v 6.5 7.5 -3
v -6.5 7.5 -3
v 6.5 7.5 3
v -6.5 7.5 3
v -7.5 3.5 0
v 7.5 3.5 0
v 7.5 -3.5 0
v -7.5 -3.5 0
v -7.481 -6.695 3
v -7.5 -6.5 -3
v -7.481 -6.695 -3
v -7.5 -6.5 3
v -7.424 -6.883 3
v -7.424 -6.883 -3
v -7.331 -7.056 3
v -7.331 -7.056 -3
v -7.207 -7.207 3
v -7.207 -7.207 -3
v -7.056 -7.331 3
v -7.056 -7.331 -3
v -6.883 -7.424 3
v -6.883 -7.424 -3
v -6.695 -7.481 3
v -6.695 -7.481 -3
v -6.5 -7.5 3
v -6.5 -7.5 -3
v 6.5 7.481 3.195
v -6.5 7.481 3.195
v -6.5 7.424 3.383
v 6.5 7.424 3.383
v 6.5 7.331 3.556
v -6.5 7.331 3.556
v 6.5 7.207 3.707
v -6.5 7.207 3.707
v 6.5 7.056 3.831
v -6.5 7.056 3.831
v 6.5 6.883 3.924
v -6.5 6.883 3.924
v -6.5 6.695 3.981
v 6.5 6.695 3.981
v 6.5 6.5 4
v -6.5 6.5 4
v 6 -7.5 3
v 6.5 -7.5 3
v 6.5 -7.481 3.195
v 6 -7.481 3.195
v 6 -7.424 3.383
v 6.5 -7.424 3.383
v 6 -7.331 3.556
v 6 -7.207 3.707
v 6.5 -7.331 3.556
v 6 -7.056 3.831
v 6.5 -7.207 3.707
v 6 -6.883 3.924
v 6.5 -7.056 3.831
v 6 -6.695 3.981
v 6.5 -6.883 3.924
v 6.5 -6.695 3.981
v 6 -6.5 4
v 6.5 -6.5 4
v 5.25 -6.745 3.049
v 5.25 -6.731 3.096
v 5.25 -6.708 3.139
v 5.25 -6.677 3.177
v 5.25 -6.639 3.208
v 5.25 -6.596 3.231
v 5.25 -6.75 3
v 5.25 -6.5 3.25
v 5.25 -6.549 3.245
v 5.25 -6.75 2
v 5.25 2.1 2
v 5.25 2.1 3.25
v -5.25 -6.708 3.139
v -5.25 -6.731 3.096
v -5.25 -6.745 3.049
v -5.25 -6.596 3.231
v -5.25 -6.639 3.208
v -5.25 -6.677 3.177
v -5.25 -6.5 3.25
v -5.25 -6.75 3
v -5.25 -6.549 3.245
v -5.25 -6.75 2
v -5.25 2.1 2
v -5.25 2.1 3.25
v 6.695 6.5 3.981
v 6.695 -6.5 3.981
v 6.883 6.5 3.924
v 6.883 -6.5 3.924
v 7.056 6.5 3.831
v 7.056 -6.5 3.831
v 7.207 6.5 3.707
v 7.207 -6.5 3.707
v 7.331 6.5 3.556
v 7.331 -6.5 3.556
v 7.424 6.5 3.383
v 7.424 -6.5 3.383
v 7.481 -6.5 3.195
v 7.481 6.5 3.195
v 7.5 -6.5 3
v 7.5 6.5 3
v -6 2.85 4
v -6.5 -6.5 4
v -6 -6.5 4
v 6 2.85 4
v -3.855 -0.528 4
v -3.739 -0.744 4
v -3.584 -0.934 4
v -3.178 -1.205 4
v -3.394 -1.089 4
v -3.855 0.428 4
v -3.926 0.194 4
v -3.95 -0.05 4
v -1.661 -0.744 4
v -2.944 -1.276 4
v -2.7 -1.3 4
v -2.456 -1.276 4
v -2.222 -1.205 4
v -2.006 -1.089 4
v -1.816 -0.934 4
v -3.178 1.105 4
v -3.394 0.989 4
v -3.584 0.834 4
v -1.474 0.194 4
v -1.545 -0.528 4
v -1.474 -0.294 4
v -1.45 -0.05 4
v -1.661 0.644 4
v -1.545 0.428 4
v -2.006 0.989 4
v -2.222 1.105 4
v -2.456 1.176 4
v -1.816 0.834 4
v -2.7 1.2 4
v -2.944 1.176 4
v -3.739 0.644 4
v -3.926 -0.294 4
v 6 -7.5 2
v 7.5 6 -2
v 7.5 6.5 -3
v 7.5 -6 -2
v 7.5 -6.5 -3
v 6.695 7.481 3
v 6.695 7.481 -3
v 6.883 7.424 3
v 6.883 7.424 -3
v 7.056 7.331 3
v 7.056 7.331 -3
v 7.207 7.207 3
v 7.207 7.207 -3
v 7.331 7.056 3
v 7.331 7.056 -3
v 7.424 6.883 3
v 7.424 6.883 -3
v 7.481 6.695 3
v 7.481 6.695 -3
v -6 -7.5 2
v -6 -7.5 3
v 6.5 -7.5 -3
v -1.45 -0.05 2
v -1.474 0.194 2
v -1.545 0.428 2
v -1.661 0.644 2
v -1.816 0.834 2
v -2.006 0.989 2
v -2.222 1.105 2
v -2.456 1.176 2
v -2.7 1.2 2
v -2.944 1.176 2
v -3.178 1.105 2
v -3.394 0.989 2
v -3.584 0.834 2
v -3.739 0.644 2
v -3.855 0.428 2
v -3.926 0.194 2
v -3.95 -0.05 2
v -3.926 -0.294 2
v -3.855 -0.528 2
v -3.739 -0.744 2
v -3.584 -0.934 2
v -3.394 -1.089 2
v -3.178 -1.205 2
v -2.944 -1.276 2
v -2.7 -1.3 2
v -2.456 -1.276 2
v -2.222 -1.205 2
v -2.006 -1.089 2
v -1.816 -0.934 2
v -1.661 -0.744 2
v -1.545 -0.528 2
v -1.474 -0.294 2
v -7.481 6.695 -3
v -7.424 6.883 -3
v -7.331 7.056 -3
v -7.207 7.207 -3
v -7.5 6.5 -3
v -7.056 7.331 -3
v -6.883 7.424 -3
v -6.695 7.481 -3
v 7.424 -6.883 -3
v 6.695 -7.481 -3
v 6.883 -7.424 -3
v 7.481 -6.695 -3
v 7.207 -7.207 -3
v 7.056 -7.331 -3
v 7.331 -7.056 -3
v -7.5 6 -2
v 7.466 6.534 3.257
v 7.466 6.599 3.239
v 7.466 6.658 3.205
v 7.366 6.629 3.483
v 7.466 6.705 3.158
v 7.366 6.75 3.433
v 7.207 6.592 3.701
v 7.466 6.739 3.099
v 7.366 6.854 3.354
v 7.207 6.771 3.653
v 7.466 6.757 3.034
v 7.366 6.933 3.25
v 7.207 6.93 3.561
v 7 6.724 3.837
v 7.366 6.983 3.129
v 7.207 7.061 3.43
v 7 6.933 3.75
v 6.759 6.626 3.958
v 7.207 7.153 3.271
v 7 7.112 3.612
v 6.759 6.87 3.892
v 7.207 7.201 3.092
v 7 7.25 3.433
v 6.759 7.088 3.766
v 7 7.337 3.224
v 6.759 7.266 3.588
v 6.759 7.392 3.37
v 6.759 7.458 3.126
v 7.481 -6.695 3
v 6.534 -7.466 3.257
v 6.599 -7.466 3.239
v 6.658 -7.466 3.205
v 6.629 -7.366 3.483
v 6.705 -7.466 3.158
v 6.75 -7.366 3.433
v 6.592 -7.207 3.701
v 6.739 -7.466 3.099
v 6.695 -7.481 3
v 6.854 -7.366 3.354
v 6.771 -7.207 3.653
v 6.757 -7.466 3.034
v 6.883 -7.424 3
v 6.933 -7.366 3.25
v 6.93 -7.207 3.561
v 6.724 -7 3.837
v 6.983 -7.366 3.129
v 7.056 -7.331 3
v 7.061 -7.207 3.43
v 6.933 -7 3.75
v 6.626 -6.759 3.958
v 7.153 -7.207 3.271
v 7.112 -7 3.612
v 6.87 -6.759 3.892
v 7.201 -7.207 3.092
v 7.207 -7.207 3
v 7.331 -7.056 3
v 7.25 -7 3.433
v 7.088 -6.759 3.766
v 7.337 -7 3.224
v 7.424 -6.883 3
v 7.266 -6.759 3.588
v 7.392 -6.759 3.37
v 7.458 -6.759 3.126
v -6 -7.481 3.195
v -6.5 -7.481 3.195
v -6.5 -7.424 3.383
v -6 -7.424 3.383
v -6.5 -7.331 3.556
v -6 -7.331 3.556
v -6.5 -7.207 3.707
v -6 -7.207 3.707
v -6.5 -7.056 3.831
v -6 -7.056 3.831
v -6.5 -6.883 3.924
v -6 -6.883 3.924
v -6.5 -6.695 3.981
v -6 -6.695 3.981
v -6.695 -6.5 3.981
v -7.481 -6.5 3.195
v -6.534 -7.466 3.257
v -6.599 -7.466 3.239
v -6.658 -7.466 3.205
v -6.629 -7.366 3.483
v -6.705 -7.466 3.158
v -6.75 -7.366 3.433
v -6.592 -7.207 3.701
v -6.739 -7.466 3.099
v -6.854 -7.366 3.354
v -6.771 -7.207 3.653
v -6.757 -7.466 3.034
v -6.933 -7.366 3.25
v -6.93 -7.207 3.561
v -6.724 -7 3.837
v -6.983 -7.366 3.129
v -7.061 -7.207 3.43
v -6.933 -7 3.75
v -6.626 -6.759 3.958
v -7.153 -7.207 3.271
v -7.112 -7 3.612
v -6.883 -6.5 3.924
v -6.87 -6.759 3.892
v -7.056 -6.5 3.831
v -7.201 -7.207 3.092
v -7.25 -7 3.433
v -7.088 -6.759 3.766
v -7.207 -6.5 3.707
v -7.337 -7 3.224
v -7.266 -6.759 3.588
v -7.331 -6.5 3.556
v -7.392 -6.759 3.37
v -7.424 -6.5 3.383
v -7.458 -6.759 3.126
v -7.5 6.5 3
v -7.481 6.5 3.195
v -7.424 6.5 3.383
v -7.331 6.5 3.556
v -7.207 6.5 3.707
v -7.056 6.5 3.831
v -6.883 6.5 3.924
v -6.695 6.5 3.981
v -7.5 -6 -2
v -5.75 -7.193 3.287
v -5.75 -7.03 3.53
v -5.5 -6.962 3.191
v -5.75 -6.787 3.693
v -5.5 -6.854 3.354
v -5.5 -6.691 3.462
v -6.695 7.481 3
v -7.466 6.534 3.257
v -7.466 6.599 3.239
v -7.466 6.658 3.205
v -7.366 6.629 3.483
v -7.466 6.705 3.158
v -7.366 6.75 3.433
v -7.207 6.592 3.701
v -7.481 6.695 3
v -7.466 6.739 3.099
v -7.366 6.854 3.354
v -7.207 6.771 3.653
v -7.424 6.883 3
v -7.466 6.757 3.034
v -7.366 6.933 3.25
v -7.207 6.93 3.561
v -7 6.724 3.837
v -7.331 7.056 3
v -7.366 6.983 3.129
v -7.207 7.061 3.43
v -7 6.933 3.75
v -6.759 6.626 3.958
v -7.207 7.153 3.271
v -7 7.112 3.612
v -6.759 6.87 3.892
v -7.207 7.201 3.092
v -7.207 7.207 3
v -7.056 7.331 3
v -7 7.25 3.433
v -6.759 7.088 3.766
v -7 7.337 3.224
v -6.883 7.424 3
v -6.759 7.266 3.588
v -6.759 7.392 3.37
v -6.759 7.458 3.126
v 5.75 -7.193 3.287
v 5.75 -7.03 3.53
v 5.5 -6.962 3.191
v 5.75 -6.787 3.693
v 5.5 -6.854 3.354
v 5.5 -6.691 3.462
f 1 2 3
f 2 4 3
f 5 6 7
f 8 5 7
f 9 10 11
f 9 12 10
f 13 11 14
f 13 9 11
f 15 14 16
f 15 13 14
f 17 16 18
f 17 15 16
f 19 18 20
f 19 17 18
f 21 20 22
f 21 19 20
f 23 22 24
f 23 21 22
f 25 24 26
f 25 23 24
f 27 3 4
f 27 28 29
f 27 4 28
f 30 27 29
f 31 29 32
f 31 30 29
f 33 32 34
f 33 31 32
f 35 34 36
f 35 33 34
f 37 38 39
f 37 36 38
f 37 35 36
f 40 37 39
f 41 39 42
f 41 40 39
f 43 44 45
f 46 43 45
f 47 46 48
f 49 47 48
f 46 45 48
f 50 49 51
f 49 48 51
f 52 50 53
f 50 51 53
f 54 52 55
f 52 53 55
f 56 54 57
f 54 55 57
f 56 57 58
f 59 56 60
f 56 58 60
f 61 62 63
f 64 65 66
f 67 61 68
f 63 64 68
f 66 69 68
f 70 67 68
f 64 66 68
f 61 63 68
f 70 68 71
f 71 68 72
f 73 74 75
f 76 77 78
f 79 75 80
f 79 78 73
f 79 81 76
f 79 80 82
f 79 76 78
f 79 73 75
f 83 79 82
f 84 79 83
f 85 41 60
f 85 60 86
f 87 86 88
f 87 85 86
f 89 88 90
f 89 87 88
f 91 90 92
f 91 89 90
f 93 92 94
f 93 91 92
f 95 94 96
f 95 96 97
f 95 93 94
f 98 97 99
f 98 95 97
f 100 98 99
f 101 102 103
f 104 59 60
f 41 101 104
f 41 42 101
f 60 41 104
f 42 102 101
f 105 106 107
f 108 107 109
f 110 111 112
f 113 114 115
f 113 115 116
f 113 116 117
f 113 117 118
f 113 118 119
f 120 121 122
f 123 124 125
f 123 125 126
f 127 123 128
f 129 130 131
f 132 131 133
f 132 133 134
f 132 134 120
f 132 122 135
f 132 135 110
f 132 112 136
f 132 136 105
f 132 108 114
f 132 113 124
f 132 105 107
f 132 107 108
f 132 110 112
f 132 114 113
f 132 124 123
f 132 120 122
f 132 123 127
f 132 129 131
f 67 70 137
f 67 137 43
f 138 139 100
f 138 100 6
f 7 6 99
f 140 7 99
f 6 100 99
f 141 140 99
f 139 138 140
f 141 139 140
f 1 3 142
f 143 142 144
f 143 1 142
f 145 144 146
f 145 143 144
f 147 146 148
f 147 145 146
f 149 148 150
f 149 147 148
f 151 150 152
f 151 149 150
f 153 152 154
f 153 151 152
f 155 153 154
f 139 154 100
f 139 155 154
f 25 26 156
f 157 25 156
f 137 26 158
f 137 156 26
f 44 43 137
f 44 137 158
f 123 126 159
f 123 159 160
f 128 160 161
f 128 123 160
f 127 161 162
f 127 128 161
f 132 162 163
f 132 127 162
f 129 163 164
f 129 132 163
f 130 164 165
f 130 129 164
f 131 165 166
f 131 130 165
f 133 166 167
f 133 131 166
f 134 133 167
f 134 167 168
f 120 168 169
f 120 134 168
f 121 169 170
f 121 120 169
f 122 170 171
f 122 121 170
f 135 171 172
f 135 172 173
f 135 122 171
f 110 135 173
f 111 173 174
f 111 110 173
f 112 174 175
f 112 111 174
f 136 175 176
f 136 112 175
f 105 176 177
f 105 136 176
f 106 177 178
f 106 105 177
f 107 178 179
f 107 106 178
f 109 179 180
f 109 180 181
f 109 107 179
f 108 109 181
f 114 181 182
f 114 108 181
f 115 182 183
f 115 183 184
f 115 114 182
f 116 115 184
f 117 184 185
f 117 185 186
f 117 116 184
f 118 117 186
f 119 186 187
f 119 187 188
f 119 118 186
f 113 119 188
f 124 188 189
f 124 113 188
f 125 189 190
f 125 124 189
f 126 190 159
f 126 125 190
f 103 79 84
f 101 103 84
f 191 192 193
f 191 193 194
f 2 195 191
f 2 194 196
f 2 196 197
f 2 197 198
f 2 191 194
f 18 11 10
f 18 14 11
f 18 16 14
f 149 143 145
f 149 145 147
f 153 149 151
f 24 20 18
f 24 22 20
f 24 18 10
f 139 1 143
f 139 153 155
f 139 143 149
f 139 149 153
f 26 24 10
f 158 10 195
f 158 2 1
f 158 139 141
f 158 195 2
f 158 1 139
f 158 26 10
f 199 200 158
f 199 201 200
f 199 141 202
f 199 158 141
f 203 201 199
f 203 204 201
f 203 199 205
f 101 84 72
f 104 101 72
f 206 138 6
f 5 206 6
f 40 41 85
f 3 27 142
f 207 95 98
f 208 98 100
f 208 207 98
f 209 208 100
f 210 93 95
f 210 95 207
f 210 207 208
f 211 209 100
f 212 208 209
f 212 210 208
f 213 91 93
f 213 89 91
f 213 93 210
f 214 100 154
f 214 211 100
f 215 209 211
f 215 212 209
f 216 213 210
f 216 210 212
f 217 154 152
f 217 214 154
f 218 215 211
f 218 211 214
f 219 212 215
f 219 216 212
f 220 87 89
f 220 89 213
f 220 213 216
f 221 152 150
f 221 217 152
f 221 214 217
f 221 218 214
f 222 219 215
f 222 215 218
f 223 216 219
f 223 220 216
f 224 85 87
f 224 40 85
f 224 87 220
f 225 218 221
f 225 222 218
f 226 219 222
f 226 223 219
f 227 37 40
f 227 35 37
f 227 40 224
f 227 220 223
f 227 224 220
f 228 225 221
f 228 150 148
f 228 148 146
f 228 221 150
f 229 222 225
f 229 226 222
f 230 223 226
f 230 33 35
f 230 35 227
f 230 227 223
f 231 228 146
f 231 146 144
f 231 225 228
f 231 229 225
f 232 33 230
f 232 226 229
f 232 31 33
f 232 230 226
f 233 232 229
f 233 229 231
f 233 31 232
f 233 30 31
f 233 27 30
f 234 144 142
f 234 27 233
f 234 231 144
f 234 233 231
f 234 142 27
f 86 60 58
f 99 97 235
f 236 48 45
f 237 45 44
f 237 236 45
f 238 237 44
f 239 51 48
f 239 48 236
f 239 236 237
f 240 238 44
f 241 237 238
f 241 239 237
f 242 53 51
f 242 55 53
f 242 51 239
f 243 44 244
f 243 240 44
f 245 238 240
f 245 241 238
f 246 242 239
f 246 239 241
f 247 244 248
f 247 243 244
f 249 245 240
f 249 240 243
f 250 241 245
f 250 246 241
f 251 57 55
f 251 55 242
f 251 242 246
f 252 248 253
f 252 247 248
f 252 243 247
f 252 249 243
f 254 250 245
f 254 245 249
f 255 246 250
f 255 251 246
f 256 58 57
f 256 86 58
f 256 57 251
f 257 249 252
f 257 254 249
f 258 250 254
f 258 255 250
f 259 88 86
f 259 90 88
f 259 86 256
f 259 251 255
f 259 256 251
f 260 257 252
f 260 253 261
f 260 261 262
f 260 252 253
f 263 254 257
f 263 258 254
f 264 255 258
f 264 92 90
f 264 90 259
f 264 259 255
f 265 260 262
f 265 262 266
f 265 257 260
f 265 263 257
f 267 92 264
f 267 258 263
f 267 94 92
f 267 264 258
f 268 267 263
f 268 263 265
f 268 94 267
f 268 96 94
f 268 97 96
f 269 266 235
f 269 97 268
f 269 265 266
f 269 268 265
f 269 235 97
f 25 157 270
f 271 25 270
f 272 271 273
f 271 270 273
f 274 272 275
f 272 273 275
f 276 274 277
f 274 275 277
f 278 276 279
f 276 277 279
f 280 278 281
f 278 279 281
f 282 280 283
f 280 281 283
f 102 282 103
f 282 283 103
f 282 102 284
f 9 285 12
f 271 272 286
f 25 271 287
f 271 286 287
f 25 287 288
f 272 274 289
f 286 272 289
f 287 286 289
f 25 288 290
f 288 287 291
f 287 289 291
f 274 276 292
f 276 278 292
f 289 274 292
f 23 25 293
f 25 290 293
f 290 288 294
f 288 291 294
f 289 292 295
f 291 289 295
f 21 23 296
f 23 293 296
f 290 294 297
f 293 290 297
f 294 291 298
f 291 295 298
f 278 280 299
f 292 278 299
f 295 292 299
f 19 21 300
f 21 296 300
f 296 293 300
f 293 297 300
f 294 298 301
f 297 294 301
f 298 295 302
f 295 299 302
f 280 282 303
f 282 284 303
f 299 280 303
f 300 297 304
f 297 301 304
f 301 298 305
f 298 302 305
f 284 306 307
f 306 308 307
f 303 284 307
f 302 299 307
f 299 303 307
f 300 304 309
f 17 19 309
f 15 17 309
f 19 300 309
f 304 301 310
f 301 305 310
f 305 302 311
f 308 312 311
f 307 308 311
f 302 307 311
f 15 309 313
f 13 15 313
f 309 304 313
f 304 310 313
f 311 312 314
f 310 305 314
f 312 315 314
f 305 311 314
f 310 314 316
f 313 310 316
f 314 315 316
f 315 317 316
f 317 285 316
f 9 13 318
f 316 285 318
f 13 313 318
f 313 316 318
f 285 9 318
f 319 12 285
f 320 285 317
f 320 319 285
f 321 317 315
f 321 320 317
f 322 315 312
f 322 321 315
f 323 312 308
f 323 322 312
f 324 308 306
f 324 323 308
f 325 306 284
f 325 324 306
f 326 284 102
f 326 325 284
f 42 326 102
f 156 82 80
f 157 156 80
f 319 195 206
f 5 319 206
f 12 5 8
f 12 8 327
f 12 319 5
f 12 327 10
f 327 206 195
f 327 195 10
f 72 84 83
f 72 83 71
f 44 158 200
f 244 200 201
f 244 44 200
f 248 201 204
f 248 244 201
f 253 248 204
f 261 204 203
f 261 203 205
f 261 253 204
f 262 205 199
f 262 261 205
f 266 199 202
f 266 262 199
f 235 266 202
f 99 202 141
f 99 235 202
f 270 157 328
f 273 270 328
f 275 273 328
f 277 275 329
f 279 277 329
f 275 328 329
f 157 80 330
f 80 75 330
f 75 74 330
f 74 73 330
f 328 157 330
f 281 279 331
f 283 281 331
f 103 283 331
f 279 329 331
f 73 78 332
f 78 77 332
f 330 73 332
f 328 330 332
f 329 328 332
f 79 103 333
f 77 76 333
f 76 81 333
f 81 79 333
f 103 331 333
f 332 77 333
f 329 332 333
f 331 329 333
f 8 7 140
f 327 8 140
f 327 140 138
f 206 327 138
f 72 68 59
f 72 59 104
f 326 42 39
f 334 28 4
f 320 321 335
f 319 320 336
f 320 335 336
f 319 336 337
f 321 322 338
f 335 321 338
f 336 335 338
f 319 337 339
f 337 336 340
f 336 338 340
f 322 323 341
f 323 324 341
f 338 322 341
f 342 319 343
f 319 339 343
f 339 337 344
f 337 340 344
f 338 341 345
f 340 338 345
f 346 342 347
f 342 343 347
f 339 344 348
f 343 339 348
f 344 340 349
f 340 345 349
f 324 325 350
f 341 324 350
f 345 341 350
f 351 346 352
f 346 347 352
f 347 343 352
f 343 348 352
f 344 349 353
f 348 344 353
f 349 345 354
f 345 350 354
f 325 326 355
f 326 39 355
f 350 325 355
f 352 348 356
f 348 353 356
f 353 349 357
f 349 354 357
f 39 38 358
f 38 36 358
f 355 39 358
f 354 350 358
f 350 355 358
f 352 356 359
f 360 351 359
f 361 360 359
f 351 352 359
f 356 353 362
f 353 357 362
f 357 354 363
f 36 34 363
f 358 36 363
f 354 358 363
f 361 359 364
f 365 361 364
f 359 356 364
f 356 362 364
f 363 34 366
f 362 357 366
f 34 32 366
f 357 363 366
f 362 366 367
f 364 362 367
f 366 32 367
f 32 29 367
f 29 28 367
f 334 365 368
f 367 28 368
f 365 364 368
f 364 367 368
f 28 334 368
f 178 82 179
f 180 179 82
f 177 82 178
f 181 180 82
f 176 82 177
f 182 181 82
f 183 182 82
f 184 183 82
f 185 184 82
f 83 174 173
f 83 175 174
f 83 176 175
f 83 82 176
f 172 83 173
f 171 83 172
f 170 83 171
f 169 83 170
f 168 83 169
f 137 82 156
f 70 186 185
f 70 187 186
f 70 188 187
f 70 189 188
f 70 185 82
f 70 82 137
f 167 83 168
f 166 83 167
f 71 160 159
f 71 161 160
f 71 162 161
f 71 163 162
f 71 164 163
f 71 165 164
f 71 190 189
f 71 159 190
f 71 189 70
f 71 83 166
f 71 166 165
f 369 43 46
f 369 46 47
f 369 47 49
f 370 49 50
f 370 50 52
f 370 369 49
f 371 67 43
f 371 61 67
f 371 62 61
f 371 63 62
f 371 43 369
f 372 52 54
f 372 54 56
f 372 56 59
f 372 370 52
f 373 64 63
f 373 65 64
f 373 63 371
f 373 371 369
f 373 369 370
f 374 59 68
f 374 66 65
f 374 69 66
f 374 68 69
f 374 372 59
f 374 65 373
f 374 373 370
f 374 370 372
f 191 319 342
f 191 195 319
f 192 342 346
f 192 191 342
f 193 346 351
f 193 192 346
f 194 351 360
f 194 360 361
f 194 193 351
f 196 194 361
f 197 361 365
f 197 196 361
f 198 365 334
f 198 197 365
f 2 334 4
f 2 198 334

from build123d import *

# Parameters (mm, degrees)
F0_W     = 15
F0_H     = 15
F1_DEPTH = 4
F2_W     = 10.5
F2_H     = 9.6
F2_R     = 1.25
F3_DEPTH = 2
F4_W     = 15
F4_H     = 15
F5_DEPTH = 3
F7_DEPTH = 15
F8_R     = 1
F9_SIZE  = 0.75


with BuildPart() as f1:
    # F0 (on Top) → F1 (new body)
    with BuildSketch(Plane.XY):
        Rectangle(F0_W, F0_H)
    extrude(amount=F1_DEPTH)

    # F2 (on face) → F3 (cut)
    with BuildSketch(Plane.XY.offset(4)):
        with Locations((0, -2.7)):
            Rectangle(F2_W, F2_H)
        with Locations((-2.7, -0.05)):
            Circle(F2_R, mode=Mode.SUBTRACT)
    extrude(amount=-F3_DEPTH, mode=Mode.SUBTRACT)

    # F4 (on face) → F5 (join)
    with BuildSketch(Plane(origin=(0, 0, 0), x_dir=(1, 0, 0), z_dir=(0, 0, -1))):
        Rectangle(F4_W, F4_H)
    extrude(amount=F5_DEPTH)

    # F6 (on face) → F7 (cut, through all)
    with BuildSketch(Plane.YZ.offset(7.5)):
        Polygon((-3.5, 0), (-6, -2), (6, -2), (3.5, 0), align=None)
    extrude(amount=-F7_DEPTH, mode=Mode.SUBTRACT)

    # F8
    f8_edges = [f1.edges().sort_by_distance(p)[0] for p in [
        (0, 7.5, 4),
        (-7.5, 0, 4),
        (7.5, 0, 4),
        (-6.375, -7.5, 4),
        (6.375, -7.5, 4),
        (-7.5, 7.5, 0.5),
        (-7.5, -7.5, 0.5),
        (7.5, -7.5, 0.5),
        (7.5, 7.5, 0.5),
    ]]
    fillet(f8_edges, radius=F8_R)

    # F9
    f9_edges = [f1.edges().sort_by_distance(p)[0] for p in [
        (5.25, -2.2, 4),
        (0, 2.1, 4),
        (-5.25, -2.2, 4),
    ]]
    chamfer(f9_edges, length=F9_SIZE)


solid = f1.part
